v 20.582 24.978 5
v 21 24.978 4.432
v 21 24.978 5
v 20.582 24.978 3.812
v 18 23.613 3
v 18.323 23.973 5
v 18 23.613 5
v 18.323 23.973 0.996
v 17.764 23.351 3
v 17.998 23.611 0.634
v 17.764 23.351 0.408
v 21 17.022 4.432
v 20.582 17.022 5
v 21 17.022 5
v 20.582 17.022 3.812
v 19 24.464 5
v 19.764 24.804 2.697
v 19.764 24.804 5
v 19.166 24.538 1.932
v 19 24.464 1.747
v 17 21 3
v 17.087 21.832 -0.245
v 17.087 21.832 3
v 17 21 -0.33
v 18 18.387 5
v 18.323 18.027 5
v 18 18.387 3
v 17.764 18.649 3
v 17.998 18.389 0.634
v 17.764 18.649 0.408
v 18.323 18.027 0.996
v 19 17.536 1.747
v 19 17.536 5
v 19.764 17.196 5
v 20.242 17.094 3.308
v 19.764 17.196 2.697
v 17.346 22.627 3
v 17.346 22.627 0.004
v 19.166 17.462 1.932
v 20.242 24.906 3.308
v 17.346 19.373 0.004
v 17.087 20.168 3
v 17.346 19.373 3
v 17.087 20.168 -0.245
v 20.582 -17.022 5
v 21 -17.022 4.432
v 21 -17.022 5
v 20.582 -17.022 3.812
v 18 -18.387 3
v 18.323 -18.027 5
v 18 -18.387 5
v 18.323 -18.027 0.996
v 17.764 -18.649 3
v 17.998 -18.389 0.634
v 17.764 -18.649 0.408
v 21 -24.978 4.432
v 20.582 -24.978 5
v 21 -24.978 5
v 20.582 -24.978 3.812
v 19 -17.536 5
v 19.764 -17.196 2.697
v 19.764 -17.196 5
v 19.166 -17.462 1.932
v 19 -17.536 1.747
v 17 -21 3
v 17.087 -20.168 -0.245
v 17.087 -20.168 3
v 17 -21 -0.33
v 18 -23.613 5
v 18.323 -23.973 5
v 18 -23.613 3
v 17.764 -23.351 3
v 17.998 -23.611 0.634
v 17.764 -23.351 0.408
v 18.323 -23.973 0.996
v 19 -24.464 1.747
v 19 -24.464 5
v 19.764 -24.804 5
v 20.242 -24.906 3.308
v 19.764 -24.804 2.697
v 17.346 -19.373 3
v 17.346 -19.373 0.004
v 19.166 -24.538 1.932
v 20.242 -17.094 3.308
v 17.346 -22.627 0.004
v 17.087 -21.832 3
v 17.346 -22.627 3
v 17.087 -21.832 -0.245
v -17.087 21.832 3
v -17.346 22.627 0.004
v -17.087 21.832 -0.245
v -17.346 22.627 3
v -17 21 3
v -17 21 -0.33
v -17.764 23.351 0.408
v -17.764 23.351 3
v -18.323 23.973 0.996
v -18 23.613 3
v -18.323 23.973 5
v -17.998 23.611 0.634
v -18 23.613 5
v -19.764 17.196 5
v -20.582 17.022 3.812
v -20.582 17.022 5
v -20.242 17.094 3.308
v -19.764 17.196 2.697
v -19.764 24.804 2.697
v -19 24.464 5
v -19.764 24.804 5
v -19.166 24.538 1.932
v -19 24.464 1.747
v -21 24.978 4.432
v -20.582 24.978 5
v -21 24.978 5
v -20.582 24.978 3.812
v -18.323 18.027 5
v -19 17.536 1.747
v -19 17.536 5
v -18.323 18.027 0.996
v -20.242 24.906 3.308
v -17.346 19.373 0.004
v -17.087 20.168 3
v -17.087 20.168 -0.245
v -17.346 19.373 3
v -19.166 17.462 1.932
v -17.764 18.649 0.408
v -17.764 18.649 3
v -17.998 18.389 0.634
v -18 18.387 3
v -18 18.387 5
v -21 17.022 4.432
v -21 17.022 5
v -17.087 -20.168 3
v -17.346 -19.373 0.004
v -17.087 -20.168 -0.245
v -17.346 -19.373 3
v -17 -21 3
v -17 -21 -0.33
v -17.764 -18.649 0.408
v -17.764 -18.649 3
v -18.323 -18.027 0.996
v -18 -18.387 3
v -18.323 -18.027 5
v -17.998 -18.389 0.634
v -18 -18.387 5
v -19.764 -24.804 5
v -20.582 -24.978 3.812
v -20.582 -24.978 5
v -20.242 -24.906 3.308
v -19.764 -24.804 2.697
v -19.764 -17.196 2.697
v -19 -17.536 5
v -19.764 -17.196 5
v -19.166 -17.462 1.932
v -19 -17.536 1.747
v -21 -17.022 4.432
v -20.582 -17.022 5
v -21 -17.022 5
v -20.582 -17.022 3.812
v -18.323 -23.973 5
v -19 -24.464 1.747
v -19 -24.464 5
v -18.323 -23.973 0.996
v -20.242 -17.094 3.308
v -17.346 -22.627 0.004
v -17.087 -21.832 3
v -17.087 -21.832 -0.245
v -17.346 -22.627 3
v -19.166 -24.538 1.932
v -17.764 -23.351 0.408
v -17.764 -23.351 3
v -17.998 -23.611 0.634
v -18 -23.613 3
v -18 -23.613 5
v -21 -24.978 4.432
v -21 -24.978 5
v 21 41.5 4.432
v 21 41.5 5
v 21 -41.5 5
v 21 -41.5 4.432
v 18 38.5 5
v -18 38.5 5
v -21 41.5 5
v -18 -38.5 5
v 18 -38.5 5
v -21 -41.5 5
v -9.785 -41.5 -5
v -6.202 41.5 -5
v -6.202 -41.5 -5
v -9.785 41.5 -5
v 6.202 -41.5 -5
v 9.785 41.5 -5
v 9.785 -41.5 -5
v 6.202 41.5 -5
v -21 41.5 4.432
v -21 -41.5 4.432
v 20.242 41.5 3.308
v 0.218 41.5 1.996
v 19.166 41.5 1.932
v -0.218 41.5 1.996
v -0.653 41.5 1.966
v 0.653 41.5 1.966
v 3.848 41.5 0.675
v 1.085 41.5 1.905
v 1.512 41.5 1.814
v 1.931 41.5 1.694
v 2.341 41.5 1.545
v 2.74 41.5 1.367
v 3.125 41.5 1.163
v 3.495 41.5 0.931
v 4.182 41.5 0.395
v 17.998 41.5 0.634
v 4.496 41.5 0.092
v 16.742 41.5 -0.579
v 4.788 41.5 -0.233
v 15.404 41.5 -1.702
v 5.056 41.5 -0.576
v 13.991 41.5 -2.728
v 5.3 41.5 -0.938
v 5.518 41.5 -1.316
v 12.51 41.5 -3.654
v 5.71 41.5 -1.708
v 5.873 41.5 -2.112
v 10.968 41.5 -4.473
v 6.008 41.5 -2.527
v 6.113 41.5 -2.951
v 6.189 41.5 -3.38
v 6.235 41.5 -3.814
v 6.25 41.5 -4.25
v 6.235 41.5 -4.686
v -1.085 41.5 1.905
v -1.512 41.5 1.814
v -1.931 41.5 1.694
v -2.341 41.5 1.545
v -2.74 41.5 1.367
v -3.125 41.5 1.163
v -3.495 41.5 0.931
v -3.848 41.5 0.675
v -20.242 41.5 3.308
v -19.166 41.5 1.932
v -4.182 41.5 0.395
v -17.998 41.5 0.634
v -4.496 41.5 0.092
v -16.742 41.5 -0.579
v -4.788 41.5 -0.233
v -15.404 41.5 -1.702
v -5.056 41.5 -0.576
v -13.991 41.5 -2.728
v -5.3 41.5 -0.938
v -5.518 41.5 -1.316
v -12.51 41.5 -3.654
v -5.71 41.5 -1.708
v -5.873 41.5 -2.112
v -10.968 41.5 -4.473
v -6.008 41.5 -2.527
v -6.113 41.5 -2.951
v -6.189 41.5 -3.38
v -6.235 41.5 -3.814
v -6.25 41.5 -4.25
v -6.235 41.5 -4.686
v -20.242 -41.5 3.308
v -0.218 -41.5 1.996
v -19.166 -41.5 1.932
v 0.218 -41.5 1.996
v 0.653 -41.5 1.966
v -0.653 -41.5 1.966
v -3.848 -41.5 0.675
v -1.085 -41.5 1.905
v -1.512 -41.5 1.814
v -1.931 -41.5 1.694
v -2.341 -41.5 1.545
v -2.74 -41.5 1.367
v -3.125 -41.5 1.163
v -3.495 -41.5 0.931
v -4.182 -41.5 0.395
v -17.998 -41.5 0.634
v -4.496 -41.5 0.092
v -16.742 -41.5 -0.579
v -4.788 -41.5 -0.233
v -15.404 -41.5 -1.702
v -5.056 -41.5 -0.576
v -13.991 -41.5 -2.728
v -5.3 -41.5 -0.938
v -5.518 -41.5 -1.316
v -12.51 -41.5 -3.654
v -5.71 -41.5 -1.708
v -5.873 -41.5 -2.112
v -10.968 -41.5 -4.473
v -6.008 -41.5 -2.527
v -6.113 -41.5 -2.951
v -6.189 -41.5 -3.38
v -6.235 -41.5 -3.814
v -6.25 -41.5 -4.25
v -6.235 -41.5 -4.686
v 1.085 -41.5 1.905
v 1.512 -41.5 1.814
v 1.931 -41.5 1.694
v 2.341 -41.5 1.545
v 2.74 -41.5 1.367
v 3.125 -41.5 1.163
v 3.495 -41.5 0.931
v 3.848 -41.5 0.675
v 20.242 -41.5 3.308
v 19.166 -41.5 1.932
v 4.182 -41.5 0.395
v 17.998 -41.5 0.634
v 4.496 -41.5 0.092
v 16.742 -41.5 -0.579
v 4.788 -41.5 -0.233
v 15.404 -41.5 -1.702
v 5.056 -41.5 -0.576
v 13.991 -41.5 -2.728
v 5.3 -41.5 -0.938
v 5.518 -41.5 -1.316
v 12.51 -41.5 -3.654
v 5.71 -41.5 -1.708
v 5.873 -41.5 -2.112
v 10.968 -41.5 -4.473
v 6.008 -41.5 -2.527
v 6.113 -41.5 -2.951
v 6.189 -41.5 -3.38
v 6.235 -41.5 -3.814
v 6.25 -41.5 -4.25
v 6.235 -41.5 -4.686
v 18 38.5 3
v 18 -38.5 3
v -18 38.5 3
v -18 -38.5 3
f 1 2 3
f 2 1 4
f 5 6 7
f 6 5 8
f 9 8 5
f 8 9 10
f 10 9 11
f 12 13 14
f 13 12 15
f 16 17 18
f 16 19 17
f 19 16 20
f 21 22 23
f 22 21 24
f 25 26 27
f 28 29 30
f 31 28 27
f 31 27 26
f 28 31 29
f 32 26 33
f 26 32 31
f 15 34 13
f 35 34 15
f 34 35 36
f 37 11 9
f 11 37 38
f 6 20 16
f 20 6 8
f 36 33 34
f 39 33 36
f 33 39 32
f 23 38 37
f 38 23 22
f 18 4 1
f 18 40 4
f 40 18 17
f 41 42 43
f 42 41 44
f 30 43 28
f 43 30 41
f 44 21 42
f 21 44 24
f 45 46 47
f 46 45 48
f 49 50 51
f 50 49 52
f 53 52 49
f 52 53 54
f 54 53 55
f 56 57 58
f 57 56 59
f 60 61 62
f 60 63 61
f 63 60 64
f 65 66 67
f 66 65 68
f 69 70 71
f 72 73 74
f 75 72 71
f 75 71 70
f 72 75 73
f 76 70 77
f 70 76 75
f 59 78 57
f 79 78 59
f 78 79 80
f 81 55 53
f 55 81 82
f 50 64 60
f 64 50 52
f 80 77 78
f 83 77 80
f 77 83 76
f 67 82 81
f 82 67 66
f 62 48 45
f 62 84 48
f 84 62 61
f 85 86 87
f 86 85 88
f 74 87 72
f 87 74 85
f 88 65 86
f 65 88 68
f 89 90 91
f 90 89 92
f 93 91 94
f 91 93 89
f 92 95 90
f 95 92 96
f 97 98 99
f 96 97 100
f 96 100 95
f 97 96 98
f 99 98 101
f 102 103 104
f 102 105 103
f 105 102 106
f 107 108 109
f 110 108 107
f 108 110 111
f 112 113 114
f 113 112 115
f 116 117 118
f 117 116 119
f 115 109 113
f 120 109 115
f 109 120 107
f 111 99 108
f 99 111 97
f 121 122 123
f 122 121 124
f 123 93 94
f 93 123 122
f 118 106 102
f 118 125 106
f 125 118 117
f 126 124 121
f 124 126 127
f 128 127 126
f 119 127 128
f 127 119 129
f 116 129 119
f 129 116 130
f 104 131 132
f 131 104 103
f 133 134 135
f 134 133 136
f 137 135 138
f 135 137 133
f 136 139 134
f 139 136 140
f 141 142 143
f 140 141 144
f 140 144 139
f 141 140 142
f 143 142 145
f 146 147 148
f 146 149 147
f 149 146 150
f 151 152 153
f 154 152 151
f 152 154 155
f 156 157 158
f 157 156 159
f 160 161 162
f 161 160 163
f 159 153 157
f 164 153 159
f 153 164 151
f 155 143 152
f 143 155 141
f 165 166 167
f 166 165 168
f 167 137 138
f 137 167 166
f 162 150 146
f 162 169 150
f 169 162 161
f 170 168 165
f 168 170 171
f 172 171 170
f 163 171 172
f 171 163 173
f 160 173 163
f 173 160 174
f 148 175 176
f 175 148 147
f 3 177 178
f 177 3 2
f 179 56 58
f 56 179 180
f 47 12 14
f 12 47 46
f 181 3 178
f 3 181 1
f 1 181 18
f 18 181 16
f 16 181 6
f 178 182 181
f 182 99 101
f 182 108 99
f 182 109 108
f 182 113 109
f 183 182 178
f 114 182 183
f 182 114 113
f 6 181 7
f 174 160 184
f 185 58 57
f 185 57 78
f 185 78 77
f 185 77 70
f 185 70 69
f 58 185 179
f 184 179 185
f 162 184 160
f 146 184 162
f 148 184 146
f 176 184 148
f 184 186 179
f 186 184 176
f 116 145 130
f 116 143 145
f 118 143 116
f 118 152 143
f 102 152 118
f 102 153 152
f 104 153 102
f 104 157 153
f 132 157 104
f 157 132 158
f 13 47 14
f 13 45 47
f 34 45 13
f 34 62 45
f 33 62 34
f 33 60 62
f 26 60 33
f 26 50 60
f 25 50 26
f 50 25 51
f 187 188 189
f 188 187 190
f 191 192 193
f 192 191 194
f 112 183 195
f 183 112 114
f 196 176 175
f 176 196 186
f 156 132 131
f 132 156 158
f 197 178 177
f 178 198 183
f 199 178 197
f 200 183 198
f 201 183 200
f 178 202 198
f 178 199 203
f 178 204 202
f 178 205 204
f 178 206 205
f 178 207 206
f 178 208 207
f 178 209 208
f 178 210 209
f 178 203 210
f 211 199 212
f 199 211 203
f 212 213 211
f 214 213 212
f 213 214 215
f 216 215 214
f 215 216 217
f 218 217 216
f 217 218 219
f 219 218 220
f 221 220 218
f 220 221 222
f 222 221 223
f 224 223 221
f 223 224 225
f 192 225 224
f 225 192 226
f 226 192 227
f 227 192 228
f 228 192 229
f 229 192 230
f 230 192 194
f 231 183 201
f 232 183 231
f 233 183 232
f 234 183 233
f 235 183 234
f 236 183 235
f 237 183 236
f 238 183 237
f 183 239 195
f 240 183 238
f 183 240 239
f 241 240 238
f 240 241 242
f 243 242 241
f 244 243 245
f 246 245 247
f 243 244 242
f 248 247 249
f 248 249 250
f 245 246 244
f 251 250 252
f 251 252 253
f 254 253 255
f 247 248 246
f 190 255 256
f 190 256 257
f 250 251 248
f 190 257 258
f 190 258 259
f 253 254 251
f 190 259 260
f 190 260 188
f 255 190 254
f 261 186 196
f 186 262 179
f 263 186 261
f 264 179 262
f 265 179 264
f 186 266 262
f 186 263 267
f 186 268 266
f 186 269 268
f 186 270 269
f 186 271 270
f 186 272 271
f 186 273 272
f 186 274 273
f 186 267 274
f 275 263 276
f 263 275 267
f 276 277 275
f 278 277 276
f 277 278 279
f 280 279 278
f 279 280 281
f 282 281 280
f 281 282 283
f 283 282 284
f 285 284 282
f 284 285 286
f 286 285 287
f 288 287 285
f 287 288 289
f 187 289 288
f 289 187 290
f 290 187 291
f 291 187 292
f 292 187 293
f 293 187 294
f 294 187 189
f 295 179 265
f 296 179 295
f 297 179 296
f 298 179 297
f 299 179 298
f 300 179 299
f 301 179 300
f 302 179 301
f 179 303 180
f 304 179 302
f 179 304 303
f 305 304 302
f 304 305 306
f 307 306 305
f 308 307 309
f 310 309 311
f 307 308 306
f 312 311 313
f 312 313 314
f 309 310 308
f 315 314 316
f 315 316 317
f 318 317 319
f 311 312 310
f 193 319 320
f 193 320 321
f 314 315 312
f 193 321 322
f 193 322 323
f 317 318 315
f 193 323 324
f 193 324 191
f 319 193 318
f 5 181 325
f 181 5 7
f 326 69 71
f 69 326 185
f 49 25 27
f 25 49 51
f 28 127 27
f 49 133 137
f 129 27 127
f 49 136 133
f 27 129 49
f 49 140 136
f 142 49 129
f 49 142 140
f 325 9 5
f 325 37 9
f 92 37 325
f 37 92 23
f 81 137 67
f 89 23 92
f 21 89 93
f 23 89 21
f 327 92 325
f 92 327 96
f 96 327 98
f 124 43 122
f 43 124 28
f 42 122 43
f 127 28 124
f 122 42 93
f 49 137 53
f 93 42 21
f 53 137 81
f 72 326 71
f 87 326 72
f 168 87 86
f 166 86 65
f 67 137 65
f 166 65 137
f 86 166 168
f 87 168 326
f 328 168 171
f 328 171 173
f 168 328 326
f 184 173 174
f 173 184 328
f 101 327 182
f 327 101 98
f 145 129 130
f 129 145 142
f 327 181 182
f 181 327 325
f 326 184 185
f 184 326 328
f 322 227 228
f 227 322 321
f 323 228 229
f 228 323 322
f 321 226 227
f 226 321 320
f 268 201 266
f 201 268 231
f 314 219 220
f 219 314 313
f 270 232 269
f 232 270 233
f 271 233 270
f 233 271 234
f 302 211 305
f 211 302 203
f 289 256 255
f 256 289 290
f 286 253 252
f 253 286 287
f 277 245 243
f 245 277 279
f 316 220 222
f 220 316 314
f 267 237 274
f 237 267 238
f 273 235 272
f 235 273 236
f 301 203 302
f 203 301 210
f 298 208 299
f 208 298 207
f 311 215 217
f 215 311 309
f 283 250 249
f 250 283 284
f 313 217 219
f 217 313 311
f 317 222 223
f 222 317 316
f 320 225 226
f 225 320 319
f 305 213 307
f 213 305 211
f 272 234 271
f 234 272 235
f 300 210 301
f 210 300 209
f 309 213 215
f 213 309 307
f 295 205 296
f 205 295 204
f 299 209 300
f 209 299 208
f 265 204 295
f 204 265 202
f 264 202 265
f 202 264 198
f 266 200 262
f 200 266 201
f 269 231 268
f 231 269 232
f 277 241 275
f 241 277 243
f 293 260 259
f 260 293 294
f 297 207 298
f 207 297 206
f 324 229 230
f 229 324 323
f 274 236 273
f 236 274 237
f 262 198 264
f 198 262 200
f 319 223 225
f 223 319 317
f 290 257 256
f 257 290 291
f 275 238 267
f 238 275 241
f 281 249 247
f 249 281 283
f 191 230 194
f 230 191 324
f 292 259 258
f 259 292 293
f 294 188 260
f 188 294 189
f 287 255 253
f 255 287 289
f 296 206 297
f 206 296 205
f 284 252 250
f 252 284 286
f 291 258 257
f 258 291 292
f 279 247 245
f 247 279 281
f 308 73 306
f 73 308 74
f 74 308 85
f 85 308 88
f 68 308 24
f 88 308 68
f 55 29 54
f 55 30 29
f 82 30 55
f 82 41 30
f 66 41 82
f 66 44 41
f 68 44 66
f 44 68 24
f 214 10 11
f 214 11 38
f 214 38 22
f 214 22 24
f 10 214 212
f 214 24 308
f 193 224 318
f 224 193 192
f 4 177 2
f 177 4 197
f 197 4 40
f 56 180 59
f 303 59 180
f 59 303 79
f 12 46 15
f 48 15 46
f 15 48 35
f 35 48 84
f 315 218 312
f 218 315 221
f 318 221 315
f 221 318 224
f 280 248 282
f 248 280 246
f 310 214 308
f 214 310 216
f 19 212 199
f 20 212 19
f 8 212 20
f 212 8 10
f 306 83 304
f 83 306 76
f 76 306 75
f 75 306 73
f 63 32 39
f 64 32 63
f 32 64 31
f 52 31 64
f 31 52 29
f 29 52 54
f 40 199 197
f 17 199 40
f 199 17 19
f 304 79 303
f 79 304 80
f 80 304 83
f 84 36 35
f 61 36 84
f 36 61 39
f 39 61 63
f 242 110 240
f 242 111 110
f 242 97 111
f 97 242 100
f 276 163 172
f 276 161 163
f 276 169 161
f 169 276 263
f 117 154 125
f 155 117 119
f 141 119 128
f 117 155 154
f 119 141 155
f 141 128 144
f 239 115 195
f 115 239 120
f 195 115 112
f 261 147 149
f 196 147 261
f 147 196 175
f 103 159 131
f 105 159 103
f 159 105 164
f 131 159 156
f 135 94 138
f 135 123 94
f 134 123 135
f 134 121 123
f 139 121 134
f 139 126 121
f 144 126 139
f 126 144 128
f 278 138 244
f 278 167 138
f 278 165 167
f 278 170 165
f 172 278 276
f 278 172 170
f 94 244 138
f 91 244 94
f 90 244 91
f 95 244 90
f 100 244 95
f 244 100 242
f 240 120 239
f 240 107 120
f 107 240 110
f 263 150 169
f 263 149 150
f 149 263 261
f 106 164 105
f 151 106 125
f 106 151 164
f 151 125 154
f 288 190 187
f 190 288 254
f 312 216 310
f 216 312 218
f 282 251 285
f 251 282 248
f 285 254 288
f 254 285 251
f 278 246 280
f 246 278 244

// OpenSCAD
w = 36;
h = 77;
t = 10;

module base () {
    translate([0,0,0])
        cube([w+6,h+6,t],true);
}

module slot (x,y) {
    d = 15;
    l = 1.2*t;
    translate([x*(w-d), y*(w-d), -l/2])
      cylinder(h=l,r=4, $fn=30);
}

module slots () {
    slot(+1,+1);
    slot(+1,-1);
    slot(-1,+1);
    slot(-1,-1);
}

module recess () {
    translate([0,0,8])
        cube ([w,h,10],true);
}

module shaft () {
    d = 12.5;
    l = 1.2*h;
    translate([0,l/2,2-d/2])
        rotate([90,0,0])
            cylinder(h=l,r=d/2,$fn=90);
}

module shape () {
    d = 1.39*w;
    l = 1.2*h;
    translate([0,l/2,.36*d])
        rotate([90,0,0])
            cylinder(h=l,r=d/2,$fn=90);
}
        

difference () {
    difference () {
        base();
        slots();
        recess();
        shaft();
    }
    difference () {
        base();
        shape();
    }
}
